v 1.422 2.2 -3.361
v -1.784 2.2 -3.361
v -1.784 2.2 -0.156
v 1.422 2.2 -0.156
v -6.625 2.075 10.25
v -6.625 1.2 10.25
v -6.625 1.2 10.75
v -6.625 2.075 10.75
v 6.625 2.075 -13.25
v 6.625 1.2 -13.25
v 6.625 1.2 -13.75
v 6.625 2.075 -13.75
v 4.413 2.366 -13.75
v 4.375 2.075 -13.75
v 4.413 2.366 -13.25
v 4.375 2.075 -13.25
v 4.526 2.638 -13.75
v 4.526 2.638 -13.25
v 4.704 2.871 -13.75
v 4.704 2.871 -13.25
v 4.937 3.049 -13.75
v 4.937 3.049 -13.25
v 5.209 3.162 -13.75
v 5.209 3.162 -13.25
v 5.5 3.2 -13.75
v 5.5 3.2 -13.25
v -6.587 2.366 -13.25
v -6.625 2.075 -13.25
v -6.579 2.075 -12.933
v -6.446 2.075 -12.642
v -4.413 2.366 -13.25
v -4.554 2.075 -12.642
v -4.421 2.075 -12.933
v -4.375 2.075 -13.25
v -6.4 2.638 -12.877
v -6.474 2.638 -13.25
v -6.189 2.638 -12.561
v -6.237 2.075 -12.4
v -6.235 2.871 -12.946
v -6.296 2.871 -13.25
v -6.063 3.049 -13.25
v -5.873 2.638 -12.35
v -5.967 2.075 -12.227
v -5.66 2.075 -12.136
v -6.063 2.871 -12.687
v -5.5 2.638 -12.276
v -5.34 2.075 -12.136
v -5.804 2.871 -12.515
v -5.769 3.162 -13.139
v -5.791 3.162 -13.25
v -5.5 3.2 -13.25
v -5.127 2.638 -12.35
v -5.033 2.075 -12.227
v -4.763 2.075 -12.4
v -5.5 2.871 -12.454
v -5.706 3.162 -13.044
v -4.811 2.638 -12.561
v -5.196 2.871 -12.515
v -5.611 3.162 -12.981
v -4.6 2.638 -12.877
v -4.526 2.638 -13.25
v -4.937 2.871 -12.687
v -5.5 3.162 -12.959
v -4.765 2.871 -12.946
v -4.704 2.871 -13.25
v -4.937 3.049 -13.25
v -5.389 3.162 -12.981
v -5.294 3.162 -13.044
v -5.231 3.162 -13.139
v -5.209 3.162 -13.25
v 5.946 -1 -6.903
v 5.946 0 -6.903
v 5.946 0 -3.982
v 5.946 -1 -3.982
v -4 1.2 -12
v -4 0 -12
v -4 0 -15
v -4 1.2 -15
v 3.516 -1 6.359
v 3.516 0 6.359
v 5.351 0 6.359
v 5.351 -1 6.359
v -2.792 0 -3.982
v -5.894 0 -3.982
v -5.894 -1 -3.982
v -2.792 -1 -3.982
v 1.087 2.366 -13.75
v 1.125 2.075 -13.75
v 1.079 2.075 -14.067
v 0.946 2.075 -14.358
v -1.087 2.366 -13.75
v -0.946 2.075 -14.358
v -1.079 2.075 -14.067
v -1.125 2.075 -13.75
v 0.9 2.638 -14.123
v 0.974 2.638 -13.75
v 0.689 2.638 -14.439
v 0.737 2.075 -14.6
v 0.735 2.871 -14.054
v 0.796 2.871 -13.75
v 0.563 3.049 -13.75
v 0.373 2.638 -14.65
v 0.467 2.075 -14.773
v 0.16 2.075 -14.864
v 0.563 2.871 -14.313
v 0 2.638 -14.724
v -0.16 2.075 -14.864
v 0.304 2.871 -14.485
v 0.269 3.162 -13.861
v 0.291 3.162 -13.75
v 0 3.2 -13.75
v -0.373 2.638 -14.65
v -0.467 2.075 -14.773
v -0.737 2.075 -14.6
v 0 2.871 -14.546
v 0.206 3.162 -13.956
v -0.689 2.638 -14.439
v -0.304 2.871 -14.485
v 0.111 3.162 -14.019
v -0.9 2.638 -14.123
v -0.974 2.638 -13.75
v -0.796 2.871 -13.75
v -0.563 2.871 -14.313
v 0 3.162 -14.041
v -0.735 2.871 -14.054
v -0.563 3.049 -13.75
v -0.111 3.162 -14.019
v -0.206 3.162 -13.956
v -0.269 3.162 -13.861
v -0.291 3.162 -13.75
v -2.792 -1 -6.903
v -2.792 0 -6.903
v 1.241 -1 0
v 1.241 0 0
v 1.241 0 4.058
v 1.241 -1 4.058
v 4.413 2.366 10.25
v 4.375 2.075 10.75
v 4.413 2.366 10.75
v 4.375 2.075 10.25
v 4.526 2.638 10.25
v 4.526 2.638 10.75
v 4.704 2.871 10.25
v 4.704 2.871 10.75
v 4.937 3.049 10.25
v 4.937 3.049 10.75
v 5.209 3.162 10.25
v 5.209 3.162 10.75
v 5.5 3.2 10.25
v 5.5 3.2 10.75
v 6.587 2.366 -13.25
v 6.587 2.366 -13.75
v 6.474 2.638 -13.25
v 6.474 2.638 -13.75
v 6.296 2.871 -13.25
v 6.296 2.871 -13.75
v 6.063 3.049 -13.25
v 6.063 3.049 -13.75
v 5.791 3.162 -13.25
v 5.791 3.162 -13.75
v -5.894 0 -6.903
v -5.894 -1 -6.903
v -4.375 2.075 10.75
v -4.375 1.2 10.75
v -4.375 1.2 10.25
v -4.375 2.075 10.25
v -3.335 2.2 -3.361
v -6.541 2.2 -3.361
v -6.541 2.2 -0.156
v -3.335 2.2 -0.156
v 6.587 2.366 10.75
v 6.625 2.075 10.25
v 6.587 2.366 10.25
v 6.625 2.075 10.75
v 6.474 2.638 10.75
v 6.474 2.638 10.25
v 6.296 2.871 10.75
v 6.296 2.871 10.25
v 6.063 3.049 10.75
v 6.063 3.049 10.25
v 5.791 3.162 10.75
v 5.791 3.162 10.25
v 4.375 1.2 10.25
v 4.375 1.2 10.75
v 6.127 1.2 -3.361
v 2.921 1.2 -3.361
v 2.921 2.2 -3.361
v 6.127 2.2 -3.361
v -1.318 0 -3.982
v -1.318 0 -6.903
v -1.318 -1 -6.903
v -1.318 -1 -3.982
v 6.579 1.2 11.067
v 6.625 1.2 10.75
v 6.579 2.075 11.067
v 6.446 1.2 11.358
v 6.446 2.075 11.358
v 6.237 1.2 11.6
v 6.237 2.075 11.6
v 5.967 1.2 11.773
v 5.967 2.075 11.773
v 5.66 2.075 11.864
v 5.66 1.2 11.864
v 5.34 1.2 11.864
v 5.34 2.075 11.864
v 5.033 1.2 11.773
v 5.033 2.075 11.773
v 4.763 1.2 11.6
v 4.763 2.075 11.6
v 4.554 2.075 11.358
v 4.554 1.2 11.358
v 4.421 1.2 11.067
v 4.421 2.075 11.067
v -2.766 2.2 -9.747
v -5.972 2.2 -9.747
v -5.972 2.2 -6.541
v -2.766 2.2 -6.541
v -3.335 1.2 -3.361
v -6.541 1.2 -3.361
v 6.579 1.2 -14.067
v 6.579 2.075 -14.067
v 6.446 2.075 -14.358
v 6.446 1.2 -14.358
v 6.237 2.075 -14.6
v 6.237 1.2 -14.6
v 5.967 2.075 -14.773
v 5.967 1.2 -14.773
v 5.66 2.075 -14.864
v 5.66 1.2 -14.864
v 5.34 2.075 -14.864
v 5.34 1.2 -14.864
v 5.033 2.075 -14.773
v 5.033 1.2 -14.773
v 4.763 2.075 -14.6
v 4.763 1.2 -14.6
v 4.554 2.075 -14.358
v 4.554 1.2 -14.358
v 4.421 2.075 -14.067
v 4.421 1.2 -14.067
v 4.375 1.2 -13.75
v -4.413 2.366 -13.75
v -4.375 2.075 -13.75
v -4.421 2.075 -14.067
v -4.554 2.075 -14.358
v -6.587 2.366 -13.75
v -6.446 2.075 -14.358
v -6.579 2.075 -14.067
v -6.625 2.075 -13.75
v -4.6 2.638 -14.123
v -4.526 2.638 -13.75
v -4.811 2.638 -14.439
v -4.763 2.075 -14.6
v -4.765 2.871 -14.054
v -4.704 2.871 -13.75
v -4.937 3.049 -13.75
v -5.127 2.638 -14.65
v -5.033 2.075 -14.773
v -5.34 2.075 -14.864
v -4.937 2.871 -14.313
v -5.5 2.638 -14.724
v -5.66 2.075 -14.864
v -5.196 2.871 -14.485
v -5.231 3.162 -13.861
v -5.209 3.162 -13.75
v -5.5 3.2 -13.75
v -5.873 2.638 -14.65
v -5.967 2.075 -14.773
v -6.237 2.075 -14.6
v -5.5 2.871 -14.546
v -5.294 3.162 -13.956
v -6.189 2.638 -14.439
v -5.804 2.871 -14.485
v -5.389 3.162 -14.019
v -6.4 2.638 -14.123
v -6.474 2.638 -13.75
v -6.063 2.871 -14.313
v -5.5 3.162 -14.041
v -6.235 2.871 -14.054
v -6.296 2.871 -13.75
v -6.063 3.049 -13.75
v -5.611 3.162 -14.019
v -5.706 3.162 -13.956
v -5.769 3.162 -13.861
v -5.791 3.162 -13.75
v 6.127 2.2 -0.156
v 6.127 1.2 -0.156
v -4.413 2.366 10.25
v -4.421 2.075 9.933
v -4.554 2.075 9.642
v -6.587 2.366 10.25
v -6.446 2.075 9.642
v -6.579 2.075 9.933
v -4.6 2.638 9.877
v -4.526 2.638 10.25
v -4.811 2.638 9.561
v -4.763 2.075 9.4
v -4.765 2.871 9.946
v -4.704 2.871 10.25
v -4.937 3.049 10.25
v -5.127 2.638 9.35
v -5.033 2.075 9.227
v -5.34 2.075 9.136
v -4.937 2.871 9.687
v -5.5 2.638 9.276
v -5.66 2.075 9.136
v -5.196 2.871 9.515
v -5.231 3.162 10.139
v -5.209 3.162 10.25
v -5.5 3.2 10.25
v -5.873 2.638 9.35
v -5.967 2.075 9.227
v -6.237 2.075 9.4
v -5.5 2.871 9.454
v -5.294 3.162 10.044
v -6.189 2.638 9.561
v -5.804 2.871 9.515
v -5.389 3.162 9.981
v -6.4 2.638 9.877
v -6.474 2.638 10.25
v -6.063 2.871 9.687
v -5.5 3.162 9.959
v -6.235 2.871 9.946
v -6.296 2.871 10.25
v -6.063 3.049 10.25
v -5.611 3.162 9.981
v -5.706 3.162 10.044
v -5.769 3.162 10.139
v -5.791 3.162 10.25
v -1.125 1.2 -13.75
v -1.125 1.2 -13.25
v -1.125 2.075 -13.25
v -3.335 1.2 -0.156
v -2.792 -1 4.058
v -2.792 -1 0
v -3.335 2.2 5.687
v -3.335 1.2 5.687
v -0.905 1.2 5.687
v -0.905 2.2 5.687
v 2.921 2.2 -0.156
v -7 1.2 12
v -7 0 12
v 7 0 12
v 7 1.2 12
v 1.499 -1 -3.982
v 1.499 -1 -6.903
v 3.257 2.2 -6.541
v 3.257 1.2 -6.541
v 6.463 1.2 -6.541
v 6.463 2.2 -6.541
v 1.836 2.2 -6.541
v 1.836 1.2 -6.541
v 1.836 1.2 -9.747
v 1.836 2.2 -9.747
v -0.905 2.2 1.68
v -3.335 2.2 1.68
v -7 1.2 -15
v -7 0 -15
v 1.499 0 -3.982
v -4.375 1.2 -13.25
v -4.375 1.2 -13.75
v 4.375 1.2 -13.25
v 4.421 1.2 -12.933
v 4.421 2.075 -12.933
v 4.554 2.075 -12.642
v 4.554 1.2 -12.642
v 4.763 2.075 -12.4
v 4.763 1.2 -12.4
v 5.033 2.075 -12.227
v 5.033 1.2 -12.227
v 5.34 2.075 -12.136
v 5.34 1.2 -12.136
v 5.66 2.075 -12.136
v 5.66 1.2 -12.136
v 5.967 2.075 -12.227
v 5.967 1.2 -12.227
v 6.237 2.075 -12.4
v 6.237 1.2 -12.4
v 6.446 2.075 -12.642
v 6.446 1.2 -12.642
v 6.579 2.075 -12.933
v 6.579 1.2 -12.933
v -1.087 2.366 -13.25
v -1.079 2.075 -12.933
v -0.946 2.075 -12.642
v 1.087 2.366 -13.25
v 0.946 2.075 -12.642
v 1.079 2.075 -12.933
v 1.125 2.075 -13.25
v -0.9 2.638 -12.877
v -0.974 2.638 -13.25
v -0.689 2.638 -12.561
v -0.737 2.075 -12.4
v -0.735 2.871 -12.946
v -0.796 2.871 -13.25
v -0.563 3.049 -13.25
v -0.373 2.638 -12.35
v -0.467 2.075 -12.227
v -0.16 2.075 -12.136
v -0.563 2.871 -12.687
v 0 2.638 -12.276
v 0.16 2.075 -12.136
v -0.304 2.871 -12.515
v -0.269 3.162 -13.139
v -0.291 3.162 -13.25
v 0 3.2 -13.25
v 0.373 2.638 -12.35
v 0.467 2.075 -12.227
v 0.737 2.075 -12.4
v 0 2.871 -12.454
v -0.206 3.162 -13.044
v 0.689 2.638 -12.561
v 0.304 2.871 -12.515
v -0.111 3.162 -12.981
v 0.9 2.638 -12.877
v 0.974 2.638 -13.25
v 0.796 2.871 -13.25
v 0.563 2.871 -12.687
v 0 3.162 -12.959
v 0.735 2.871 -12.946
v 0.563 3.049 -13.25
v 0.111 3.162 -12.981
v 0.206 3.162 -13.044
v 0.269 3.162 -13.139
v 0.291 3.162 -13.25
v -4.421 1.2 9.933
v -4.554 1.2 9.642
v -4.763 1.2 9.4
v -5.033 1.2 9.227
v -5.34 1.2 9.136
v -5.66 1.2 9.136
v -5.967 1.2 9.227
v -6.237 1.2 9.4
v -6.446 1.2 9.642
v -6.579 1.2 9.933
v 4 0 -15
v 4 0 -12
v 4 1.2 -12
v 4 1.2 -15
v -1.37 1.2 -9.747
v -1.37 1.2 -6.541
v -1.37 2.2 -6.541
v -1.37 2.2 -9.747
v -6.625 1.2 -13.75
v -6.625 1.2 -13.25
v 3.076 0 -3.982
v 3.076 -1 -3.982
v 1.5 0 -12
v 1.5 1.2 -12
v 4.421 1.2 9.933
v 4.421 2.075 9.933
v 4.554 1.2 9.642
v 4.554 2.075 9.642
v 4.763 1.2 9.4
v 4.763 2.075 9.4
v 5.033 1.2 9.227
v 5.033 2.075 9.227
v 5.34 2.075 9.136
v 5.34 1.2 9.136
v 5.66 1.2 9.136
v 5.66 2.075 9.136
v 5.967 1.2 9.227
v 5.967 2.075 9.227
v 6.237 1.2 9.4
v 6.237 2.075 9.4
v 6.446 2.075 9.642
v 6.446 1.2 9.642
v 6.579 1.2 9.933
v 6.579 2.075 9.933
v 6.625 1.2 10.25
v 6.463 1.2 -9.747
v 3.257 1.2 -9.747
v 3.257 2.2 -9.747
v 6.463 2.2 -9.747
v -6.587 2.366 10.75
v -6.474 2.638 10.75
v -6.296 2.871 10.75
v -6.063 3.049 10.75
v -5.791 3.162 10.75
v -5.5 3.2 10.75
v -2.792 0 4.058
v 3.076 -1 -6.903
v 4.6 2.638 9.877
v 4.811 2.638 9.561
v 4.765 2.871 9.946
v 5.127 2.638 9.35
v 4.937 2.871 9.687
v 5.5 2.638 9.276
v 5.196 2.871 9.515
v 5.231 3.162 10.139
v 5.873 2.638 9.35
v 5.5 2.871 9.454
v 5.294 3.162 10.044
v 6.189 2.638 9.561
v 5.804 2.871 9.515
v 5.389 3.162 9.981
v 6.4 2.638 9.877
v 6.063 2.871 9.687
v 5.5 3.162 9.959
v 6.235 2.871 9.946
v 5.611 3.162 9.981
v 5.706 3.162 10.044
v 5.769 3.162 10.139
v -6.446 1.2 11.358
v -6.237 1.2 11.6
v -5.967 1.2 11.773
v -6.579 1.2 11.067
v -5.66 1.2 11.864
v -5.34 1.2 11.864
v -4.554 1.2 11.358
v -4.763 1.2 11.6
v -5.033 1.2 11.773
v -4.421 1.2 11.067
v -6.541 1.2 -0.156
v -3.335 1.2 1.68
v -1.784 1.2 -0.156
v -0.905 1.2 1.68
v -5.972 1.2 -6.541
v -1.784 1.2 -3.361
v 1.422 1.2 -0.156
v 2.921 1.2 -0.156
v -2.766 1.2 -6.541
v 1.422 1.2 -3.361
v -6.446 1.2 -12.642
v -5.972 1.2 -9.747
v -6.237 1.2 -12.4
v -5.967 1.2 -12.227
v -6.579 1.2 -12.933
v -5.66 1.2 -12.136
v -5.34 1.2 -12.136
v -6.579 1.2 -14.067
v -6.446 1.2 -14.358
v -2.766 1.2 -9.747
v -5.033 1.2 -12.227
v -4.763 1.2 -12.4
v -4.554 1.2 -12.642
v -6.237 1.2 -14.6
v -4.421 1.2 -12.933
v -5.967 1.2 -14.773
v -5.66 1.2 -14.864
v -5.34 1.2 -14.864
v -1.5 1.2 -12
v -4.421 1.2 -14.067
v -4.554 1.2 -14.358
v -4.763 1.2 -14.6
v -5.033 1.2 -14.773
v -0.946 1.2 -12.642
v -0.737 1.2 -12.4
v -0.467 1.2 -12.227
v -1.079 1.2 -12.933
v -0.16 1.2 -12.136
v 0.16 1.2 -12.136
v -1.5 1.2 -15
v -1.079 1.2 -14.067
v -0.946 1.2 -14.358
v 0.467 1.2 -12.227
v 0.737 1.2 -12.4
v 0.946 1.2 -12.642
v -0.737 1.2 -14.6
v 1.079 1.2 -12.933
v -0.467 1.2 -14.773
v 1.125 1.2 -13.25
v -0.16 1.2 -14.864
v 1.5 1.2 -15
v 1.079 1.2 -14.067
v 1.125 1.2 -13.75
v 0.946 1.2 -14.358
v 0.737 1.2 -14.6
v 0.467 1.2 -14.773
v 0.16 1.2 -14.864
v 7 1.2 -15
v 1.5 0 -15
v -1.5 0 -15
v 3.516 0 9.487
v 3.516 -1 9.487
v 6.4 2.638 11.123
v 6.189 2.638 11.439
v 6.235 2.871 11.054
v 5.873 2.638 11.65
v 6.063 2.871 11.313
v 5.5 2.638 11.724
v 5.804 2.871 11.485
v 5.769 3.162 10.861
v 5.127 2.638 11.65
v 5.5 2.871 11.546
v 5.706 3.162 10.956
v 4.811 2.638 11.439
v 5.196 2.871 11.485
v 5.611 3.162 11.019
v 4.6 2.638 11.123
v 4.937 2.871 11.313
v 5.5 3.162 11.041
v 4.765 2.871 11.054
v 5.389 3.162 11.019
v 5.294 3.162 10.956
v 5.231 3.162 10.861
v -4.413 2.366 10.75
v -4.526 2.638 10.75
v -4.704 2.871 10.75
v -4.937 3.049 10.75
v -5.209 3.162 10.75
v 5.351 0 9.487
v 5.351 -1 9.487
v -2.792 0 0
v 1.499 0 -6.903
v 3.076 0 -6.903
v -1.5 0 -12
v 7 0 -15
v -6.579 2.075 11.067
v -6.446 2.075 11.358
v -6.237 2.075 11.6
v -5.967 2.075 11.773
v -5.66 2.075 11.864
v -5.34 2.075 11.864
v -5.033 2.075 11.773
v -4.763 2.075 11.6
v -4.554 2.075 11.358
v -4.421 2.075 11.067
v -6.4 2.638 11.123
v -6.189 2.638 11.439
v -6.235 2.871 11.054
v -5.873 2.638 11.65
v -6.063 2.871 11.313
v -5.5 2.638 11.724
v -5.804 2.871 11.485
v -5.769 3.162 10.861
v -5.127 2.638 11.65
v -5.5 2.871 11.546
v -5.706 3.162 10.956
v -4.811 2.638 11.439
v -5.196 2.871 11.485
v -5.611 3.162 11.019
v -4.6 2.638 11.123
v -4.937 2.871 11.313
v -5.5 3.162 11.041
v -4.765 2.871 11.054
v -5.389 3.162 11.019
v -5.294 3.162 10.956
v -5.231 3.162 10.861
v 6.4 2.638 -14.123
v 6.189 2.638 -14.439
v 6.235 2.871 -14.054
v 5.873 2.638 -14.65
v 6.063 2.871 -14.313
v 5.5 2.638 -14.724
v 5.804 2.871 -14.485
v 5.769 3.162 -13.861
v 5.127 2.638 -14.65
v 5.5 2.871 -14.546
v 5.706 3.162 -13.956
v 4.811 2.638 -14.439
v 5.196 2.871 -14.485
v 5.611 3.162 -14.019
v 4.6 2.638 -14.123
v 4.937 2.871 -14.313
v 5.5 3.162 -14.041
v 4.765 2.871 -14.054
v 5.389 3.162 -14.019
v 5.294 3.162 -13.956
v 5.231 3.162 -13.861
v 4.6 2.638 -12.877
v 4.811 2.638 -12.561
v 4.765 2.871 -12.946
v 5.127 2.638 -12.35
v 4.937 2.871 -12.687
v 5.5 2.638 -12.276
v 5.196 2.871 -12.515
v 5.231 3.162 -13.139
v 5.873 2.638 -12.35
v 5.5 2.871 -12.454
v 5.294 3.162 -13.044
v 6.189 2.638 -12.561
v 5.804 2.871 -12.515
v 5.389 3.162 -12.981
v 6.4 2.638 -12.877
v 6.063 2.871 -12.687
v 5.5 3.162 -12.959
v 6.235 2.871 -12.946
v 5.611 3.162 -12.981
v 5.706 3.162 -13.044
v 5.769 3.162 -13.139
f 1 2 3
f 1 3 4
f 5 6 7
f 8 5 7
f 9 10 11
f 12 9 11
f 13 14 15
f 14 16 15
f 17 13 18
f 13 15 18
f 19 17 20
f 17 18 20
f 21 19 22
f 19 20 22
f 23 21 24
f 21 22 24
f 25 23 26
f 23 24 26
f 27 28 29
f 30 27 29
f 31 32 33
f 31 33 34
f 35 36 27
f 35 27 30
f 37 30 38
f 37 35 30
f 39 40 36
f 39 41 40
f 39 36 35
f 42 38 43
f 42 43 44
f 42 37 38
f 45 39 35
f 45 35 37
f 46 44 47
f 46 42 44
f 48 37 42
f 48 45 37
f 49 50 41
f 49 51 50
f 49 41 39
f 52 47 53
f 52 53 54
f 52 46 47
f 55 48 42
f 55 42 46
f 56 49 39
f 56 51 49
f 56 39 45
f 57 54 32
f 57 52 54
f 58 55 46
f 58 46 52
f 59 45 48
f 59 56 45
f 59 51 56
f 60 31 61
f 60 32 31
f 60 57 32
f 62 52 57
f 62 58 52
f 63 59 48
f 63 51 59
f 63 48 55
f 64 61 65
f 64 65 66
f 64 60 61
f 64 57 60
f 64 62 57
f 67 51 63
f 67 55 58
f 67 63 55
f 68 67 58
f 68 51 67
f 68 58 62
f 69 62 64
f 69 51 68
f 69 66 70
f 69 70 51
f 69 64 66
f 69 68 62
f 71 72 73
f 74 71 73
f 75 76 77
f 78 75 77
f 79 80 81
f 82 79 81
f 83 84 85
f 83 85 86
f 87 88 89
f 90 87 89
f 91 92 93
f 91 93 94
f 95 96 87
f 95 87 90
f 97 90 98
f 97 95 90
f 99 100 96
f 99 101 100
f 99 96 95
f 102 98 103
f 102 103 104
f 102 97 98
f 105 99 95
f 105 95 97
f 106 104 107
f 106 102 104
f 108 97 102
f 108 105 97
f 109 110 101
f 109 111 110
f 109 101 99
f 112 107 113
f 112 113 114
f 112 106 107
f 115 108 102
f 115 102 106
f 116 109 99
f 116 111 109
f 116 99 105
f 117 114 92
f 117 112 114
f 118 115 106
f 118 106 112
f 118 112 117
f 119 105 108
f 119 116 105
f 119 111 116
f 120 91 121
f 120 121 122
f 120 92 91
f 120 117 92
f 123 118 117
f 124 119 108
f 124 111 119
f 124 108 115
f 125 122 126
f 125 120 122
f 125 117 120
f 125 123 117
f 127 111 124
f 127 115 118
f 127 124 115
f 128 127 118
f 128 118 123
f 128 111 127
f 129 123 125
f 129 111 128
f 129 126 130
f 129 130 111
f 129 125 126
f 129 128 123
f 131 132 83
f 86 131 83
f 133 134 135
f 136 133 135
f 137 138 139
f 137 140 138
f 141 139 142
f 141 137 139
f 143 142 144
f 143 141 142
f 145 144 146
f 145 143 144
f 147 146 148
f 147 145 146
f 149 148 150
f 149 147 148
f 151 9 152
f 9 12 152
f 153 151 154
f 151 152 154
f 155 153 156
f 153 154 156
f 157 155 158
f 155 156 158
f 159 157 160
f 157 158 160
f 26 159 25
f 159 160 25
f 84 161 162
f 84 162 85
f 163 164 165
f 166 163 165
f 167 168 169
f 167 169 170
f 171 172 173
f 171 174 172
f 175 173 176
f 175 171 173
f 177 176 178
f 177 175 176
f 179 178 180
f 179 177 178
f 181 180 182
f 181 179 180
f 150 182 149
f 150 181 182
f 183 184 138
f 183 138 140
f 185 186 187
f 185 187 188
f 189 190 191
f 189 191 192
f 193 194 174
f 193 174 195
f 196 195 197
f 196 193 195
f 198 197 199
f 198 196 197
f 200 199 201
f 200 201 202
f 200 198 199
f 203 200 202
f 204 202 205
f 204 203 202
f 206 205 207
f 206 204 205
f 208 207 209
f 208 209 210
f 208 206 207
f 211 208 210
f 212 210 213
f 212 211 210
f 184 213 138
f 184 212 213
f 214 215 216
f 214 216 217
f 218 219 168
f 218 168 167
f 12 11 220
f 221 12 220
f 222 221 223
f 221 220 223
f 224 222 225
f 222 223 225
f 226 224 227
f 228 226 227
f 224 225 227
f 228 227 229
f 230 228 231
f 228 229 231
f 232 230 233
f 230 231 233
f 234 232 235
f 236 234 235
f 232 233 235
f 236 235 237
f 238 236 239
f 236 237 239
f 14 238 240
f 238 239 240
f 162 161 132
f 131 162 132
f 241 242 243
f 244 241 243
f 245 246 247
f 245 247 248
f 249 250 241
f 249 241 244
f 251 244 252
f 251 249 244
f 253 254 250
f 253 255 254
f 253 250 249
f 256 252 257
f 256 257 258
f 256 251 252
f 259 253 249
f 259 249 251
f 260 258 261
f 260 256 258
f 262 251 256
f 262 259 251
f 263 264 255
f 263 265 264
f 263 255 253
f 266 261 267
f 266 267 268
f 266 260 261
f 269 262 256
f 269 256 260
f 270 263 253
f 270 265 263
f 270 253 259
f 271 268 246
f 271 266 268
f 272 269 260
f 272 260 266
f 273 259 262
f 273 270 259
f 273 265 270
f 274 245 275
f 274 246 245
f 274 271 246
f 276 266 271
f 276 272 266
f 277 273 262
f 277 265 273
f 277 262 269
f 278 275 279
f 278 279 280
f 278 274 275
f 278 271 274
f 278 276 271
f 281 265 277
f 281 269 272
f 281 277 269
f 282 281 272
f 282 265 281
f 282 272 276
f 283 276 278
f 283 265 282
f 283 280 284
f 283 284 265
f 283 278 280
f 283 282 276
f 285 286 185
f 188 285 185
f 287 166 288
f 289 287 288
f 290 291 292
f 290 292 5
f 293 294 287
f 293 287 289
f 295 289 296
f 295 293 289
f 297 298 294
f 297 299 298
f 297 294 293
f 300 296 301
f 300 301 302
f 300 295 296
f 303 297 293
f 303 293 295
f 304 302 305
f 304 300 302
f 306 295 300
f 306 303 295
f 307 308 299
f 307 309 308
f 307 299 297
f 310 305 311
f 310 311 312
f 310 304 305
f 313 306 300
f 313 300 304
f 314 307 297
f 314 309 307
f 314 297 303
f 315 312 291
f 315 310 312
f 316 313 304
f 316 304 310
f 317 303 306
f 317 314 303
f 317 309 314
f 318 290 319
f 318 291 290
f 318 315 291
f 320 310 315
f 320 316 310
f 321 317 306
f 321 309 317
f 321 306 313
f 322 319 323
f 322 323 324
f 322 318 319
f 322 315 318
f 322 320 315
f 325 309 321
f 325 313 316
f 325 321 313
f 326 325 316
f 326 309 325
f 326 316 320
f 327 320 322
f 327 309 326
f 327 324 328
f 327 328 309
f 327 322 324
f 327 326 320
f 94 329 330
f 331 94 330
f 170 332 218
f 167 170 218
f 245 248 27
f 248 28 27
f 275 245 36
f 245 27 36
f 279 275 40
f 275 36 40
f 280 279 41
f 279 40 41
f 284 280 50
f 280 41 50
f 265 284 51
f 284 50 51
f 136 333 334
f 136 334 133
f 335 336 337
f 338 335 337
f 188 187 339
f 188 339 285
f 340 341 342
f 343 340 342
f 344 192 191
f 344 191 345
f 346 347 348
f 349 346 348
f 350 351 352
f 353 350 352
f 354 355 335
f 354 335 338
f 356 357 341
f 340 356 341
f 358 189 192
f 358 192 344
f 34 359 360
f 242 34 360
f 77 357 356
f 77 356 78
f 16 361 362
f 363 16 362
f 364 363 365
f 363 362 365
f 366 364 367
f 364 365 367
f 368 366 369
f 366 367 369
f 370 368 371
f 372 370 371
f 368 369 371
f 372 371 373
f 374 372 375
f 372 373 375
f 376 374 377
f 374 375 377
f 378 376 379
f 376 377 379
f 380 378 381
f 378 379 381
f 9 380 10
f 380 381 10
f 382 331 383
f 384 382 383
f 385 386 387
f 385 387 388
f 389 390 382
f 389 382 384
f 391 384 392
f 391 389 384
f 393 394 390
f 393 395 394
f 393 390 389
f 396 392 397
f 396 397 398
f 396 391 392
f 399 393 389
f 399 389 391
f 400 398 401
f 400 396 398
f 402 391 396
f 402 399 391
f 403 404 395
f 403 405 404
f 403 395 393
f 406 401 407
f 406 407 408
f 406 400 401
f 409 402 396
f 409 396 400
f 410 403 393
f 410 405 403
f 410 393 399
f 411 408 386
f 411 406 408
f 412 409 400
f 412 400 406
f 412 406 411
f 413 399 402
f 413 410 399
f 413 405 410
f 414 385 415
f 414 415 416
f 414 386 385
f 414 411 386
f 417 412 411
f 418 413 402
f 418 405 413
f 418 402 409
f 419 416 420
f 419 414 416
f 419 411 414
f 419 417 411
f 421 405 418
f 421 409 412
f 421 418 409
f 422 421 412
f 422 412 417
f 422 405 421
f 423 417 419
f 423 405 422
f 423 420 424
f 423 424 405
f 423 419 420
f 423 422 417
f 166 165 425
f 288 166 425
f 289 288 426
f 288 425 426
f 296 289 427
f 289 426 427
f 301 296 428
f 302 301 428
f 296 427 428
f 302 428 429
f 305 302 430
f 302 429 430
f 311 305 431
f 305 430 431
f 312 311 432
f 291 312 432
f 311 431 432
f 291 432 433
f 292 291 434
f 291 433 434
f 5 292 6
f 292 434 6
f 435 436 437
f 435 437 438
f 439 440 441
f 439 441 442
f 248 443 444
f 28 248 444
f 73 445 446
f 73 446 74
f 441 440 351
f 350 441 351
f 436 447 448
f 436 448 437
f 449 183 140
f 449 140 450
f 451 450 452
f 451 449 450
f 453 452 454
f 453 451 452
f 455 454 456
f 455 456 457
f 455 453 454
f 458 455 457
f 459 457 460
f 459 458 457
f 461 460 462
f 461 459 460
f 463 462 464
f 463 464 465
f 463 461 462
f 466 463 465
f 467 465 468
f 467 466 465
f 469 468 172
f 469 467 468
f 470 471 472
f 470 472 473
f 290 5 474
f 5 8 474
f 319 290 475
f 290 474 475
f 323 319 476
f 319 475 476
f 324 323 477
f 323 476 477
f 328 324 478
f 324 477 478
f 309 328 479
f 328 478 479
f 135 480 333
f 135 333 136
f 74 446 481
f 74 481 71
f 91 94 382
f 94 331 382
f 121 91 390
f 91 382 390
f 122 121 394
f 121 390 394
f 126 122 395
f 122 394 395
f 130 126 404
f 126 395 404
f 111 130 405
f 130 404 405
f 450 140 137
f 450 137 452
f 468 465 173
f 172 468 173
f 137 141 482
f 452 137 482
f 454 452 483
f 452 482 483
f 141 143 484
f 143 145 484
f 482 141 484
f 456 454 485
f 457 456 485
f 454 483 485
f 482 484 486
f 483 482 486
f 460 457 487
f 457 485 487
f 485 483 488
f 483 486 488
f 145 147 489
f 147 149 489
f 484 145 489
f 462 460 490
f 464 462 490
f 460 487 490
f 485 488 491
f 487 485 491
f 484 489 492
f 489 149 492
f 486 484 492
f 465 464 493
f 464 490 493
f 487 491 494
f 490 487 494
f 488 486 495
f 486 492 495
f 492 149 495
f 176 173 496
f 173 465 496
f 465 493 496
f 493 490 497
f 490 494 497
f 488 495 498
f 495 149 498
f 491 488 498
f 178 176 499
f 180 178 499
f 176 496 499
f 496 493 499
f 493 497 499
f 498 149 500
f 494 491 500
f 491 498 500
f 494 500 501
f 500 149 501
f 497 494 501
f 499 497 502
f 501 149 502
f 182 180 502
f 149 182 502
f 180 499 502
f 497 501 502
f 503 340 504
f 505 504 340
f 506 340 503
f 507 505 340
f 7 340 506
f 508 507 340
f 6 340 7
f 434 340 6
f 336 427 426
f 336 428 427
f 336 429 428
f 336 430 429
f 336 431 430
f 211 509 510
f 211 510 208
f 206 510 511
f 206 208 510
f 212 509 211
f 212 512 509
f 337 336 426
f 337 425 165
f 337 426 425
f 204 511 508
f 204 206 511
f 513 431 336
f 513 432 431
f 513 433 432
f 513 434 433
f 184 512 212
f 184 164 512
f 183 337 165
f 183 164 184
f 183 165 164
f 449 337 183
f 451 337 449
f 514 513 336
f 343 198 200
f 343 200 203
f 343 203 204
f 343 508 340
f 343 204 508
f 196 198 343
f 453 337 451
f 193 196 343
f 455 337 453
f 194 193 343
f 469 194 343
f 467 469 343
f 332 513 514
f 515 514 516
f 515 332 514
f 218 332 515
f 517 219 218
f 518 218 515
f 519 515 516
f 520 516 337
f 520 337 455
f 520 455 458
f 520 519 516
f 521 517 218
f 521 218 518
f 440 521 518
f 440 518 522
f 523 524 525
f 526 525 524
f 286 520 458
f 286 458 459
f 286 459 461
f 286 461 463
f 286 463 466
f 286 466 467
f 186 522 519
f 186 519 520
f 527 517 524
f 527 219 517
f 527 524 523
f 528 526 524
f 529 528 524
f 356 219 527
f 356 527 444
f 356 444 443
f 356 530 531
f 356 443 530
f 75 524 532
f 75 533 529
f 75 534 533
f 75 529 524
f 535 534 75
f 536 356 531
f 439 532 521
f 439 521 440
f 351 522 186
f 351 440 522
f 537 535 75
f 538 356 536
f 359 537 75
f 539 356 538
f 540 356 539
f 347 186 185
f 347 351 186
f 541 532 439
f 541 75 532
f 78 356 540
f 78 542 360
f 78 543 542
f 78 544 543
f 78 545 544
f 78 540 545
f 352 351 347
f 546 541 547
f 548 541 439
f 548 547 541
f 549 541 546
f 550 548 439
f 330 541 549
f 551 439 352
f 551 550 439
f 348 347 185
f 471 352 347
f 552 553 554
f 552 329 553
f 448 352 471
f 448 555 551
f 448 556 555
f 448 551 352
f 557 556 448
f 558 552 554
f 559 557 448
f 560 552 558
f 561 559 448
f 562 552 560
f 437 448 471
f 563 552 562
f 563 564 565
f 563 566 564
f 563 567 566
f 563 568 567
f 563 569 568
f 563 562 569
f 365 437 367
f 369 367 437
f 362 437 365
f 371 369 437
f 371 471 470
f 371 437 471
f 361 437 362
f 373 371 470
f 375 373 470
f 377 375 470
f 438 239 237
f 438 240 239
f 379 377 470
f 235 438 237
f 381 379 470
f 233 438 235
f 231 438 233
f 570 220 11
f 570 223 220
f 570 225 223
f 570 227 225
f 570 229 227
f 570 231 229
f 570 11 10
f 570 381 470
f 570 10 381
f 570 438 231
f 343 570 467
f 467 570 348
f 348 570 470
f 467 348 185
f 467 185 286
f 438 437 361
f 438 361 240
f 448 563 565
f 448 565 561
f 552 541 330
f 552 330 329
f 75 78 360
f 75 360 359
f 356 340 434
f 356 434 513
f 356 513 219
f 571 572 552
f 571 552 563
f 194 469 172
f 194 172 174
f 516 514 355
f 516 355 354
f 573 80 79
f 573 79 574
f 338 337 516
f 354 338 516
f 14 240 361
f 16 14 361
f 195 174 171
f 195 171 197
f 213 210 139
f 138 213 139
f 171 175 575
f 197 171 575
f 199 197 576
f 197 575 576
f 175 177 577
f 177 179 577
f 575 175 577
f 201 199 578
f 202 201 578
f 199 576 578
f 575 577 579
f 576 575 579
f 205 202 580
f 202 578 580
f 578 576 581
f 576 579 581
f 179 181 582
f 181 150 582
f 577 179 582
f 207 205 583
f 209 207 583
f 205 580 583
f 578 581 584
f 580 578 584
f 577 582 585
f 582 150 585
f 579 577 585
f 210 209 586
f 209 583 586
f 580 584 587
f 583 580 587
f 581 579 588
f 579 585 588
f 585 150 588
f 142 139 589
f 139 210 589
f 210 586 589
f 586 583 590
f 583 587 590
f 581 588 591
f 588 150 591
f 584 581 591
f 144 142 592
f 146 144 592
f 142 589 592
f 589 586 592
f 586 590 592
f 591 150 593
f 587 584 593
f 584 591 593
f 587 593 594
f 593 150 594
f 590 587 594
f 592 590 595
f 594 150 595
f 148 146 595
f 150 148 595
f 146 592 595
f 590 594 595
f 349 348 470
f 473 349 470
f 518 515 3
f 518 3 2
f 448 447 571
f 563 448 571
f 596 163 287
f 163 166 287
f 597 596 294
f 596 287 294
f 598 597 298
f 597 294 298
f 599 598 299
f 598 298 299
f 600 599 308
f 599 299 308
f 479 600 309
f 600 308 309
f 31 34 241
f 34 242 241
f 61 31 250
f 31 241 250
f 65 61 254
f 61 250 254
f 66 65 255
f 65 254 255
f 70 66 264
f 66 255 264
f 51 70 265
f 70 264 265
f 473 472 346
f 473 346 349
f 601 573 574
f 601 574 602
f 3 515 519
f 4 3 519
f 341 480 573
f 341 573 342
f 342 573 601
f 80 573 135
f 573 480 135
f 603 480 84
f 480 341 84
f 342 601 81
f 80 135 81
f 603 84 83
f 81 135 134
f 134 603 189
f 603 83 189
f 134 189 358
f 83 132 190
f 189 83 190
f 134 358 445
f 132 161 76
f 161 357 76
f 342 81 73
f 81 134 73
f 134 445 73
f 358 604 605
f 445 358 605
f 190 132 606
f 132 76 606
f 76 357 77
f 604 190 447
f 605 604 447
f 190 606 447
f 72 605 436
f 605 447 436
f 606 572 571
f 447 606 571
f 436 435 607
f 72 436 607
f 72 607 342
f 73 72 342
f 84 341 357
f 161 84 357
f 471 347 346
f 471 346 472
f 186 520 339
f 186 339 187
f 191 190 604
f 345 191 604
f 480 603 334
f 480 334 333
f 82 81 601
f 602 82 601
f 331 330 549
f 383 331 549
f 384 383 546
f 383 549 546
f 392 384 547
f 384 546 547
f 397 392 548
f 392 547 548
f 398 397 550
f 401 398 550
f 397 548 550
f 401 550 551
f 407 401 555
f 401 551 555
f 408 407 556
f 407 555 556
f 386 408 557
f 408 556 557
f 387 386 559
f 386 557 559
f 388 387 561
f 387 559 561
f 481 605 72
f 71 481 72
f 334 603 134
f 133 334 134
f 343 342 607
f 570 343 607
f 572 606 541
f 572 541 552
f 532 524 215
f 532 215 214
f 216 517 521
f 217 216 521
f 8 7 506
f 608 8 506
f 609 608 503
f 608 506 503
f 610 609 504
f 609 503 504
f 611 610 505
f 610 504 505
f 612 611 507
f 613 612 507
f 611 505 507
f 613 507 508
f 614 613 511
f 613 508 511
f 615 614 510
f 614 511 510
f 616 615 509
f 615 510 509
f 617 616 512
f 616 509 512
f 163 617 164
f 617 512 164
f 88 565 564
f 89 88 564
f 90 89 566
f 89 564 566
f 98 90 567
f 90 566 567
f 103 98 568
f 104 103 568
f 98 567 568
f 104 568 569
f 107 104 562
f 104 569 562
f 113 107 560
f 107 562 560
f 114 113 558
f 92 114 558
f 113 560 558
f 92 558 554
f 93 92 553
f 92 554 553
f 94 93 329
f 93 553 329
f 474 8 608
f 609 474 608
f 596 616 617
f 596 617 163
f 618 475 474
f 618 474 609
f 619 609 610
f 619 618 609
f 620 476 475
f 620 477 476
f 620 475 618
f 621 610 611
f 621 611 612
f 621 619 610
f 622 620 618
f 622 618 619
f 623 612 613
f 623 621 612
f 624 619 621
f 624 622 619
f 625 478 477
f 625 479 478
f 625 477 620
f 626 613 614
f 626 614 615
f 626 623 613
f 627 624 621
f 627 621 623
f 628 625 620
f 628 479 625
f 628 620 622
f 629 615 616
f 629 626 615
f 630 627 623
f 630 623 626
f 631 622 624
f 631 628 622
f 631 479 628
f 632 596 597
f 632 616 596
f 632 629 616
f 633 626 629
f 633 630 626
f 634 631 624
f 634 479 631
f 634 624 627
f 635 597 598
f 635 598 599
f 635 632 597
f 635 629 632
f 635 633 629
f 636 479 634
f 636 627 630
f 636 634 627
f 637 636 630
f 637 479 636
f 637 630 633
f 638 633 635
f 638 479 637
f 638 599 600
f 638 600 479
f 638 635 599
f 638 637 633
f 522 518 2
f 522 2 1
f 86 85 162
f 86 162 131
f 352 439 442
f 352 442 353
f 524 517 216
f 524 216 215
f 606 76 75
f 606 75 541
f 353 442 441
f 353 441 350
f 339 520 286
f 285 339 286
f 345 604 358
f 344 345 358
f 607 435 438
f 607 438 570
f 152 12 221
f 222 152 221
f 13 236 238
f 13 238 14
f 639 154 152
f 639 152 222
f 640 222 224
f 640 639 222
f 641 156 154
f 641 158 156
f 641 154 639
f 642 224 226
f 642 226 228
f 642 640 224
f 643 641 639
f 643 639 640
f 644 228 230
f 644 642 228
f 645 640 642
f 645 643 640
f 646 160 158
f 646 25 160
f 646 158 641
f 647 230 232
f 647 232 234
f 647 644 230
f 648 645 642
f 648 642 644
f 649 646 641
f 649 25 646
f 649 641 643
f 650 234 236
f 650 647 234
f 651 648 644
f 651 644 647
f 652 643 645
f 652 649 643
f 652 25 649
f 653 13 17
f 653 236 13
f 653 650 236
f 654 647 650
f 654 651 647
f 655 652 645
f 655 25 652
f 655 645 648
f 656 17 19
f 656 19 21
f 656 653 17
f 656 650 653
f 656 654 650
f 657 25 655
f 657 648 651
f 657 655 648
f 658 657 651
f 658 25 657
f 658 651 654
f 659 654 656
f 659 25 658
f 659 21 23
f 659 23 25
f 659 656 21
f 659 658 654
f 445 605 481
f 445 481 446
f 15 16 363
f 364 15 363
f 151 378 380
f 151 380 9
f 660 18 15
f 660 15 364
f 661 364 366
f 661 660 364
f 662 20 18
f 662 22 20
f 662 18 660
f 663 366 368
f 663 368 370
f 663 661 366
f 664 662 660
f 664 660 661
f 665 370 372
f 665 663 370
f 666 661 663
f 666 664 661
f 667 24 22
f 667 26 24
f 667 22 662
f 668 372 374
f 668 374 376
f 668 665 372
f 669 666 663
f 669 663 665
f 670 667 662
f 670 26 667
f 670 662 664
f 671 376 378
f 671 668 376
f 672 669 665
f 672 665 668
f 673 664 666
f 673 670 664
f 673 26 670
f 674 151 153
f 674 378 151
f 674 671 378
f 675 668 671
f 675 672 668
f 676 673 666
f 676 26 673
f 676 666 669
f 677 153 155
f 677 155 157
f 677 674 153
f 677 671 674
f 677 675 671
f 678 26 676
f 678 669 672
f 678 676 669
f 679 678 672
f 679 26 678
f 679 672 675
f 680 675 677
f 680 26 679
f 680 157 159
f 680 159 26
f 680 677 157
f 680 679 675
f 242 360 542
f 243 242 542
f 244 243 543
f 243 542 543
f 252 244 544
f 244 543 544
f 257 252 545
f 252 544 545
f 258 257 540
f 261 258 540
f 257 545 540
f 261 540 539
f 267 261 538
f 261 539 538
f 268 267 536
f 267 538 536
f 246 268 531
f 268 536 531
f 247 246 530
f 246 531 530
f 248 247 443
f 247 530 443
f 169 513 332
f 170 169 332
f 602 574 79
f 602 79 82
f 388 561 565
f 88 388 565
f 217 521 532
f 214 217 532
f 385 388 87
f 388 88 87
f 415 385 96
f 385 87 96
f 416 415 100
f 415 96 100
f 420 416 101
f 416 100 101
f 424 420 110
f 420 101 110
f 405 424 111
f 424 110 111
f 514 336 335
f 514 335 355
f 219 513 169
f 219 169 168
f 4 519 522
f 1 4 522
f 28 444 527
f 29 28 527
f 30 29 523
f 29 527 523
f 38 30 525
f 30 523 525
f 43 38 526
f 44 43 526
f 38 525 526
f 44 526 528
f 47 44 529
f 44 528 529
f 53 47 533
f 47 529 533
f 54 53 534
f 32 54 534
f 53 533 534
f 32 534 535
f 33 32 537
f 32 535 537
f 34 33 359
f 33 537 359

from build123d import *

# Parameters (mm, degrees)
SKETCH1_W               = 14
SKETCH1_H               = 24
SKETCH1_W_2             = 3
SKETCH1_H_2             = 3
PCB_DEPTH               = 1.2
SOLDER_JOINTS_DEPTH     = 2
SOLDER_FILLETS_R        = 1.125
SKETCH2_W               = 3.205722041
SKETCH2_H               = 3.205722042
SKETCH2_W_2             = 3.205722042
SKETCH2_W_3             = 2.430144128
SKETCH2_H_2             = 4.007152552
TOP_COMPONENTS_DEPTH    = 1
SKETCH3_W               = 4.033005149
SKETCH3_H               = 4.058308378
SKETCH3_W_2             = 3.102311653
SKETCH3_H_2             = 2.921343474
SKETCH3_W_3             = 2.817933085
SKETCH3_W_4             = 2.869638279
SKETCH3_W_5             = 1.835534395
SKETCH3_H_3             = 3.12816425
BOTTOM_COMPONENTS_DEPTH = 1


with BuildPart() as part:
    # Sketch1 → PCB (new body)
    with BuildSketch(Plane(origin=(0, 0, 0), x_dir=(1, 0, 0), z_dir=(0, 1, 0))):
        Rectangle(SKETCH1_W, SKETCH1_H)
        with Locations((-5.5, 13.5)):
            Rectangle(SKETCH1_W_2, SKETCH1_H_2)
        with Locations((0, 13.5)):
            Rectangle(SKETCH1_W_2, SKETCH1_H_2)
        with Locations((5.5, 13.5)):
            Rectangle(SKETCH1_W_2, SKETCH1_H_2)
    extrude(amount=PCB_DEPTH)

    # Sketch5 → Solder joints (add)
    with BuildSketch(Plane(origin=(0, 1.2, 0), x_dir=(1, 0, 0), z_dir=(0, 1, 0))):
        with BuildLine():
            Line((-4.375, 13.25), (-4.375, 13.75))
            ThreePointArc((-4.375, 13.75), (-5.5, 14.875), (-6.625, 13.75))
            Line((-6.625, 13.75), (-6.625, 13.25))
            ThreePointArc((-6.625, 13.25), (-5.5, 12.125), (-4.375, 13.25))
        make_face()
        with BuildLine():
            Line((-1.125, 13.75), (-1.125, 13.25))
            ThreePointArc((-1.125, 13.25), (0, 12.125), (1.125, 13.25))
            Line((1.125, 13.25), (1.125, 13.75))
            ThreePointArc((1.125, 13.75), (0, 14.875), (-1.125, 13.75))
        make_face()
        with BuildLine():
            Line((4.375, 13.75), (4.375, 13.25))
            ThreePointArc((4.375, 13.25), (5.5, 12.125), (6.625, 13.25))
            Line((6.625, 13.25), (6.625, 13.75))
            ThreePointArc((6.625, 13.75), (5.5, 14.875), (4.375, 13.75))
        make_face()
        with BuildLine():
            Line((-6.625, -10.25), (-6.625, -10.75))
            ThreePointArc((-6.625, -10.75), (-5.5, -11.875), (-4.375, -10.75))
            Line((-4.375, -10.75), (-4.375, -10.25))
            ThreePointArc((-4.375, -10.25), (-5.5, -9.125), (-6.625, -10.25))
        make_face()
        with BuildLine():
            ThreePointArc((6.625, -10.75), (5.5, -11.875), (4.375, -10.75))
            Line((4.375, -10.75), (4.375, -10.25))
            ThreePointArc((4.375, -10.25), (5.5, -9.125), (6.625, -10.25))
            Line((6.625, -10.25), (6.625, -10.75))
        make_face()
    extrude(amount=SOLDER_JOINTS_DEPTH)

    # Solder fillets
    solder_fillets_edges = [part.edges().sort_by_distance(p)[0] for p in [
        (-6.625, 3.2, -13.5),
        (-4.375, 3.2, -13.5),
        (-5.5, 3.2, -14.875),
        (-5.5, 3.2, -12.125),
        (1.125, 3.2, -13.5),
        (-1.125, 3.2, -13.5),
        (0, 3.2, -12.125),
        (0, 3.2, -14.875),
        (6.625, 3.2, -13.5),
        (4.375, 3.2, -13.5),
        (5.5, 3.2, -12.125),
        (5.5, 3.2, -14.875),
        (-4.375, 3.2, 10.5),
        (-6.625, 3.2, 10.5),
        (-5.5, 3.2, 11.875),
        (-5.5, 3.2, 9.125),
        (5.5, 3.2, 11.875),
        (6.625, 3.2, 10.5),
        (5.5, 3.2, 9.125),
        (4.375, 3.2, 10.5),
    ]]
    fillet(solder_fillets_edges, radius=SOLDER_FILLETS_R - 0.0001)  # a hair under: the kernel refuses the full size

    # Sketch2 → Top components (add)
    with BuildSketch(Plane(origin=(0, 1.2, 0), x_dir=(1, 0, 0), z_dir=(0, 1, 0))):
        with Locations((-4.369088912, 8.144117457)):
            Rectangle(SKETCH2_W, SKETCH2_H)
        with Locations((0.232673374, 8.144117457)):
            Rectangle(SKETCH2_W_2, SKETCH2_H)
        with Locations((4.860288257, 8.144117457)):
            Rectangle(SKETCH2_W, SKETCH2_H)
        with Locations((-4.937846048, 1.758525971)):
            Rectangle(SKETCH2_W_2, SKETCH2_H)
        with Locations((-0.18096818, 1.758525971)):
            Rectangle(SKETCH2_W_2, SKETCH2_H)
        with Locations((4.524204494, 1.758525971)):
            Rectangle(SKETCH2_W_2, SKETCH2_H)
        with Locations((-2.119912963, -3.68344572)):
            Rectangle(SKETCH2_W_3, SKETCH2_H_2)
    extrude(amount=TOP_COMPONENTS_DEPTH)

    # Sketch3 → Bottom components (add)
    with BuildSketch(Plane.XZ):
        with Locations((-0.775577914, 2.029154189)):
            Rectangle(SKETCH3_W, SKETCH3_H)
        with Locations((-4.343236315, -5.442521059)):
            Rectangle(SKETCH3_W_2, SKETCH3_H_2)
        with Locations((0.090484089, -5.442521059)):
            Rectangle(SKETCH3_W_3, SKETCH3_H_2)
        with Locations((4.511278196, -5.442521059)):
            Rectangle(SKETCH3_W_4, SKETCH3_H_2)
        with Locations((4.433720405, 7.923271646)):
            Rectangle(SKETCH3_W_5, SKETCH3_H_3)
    extrude(amount=BOTTOM_COMPONENTS_DEPTH)


solid = part.part
